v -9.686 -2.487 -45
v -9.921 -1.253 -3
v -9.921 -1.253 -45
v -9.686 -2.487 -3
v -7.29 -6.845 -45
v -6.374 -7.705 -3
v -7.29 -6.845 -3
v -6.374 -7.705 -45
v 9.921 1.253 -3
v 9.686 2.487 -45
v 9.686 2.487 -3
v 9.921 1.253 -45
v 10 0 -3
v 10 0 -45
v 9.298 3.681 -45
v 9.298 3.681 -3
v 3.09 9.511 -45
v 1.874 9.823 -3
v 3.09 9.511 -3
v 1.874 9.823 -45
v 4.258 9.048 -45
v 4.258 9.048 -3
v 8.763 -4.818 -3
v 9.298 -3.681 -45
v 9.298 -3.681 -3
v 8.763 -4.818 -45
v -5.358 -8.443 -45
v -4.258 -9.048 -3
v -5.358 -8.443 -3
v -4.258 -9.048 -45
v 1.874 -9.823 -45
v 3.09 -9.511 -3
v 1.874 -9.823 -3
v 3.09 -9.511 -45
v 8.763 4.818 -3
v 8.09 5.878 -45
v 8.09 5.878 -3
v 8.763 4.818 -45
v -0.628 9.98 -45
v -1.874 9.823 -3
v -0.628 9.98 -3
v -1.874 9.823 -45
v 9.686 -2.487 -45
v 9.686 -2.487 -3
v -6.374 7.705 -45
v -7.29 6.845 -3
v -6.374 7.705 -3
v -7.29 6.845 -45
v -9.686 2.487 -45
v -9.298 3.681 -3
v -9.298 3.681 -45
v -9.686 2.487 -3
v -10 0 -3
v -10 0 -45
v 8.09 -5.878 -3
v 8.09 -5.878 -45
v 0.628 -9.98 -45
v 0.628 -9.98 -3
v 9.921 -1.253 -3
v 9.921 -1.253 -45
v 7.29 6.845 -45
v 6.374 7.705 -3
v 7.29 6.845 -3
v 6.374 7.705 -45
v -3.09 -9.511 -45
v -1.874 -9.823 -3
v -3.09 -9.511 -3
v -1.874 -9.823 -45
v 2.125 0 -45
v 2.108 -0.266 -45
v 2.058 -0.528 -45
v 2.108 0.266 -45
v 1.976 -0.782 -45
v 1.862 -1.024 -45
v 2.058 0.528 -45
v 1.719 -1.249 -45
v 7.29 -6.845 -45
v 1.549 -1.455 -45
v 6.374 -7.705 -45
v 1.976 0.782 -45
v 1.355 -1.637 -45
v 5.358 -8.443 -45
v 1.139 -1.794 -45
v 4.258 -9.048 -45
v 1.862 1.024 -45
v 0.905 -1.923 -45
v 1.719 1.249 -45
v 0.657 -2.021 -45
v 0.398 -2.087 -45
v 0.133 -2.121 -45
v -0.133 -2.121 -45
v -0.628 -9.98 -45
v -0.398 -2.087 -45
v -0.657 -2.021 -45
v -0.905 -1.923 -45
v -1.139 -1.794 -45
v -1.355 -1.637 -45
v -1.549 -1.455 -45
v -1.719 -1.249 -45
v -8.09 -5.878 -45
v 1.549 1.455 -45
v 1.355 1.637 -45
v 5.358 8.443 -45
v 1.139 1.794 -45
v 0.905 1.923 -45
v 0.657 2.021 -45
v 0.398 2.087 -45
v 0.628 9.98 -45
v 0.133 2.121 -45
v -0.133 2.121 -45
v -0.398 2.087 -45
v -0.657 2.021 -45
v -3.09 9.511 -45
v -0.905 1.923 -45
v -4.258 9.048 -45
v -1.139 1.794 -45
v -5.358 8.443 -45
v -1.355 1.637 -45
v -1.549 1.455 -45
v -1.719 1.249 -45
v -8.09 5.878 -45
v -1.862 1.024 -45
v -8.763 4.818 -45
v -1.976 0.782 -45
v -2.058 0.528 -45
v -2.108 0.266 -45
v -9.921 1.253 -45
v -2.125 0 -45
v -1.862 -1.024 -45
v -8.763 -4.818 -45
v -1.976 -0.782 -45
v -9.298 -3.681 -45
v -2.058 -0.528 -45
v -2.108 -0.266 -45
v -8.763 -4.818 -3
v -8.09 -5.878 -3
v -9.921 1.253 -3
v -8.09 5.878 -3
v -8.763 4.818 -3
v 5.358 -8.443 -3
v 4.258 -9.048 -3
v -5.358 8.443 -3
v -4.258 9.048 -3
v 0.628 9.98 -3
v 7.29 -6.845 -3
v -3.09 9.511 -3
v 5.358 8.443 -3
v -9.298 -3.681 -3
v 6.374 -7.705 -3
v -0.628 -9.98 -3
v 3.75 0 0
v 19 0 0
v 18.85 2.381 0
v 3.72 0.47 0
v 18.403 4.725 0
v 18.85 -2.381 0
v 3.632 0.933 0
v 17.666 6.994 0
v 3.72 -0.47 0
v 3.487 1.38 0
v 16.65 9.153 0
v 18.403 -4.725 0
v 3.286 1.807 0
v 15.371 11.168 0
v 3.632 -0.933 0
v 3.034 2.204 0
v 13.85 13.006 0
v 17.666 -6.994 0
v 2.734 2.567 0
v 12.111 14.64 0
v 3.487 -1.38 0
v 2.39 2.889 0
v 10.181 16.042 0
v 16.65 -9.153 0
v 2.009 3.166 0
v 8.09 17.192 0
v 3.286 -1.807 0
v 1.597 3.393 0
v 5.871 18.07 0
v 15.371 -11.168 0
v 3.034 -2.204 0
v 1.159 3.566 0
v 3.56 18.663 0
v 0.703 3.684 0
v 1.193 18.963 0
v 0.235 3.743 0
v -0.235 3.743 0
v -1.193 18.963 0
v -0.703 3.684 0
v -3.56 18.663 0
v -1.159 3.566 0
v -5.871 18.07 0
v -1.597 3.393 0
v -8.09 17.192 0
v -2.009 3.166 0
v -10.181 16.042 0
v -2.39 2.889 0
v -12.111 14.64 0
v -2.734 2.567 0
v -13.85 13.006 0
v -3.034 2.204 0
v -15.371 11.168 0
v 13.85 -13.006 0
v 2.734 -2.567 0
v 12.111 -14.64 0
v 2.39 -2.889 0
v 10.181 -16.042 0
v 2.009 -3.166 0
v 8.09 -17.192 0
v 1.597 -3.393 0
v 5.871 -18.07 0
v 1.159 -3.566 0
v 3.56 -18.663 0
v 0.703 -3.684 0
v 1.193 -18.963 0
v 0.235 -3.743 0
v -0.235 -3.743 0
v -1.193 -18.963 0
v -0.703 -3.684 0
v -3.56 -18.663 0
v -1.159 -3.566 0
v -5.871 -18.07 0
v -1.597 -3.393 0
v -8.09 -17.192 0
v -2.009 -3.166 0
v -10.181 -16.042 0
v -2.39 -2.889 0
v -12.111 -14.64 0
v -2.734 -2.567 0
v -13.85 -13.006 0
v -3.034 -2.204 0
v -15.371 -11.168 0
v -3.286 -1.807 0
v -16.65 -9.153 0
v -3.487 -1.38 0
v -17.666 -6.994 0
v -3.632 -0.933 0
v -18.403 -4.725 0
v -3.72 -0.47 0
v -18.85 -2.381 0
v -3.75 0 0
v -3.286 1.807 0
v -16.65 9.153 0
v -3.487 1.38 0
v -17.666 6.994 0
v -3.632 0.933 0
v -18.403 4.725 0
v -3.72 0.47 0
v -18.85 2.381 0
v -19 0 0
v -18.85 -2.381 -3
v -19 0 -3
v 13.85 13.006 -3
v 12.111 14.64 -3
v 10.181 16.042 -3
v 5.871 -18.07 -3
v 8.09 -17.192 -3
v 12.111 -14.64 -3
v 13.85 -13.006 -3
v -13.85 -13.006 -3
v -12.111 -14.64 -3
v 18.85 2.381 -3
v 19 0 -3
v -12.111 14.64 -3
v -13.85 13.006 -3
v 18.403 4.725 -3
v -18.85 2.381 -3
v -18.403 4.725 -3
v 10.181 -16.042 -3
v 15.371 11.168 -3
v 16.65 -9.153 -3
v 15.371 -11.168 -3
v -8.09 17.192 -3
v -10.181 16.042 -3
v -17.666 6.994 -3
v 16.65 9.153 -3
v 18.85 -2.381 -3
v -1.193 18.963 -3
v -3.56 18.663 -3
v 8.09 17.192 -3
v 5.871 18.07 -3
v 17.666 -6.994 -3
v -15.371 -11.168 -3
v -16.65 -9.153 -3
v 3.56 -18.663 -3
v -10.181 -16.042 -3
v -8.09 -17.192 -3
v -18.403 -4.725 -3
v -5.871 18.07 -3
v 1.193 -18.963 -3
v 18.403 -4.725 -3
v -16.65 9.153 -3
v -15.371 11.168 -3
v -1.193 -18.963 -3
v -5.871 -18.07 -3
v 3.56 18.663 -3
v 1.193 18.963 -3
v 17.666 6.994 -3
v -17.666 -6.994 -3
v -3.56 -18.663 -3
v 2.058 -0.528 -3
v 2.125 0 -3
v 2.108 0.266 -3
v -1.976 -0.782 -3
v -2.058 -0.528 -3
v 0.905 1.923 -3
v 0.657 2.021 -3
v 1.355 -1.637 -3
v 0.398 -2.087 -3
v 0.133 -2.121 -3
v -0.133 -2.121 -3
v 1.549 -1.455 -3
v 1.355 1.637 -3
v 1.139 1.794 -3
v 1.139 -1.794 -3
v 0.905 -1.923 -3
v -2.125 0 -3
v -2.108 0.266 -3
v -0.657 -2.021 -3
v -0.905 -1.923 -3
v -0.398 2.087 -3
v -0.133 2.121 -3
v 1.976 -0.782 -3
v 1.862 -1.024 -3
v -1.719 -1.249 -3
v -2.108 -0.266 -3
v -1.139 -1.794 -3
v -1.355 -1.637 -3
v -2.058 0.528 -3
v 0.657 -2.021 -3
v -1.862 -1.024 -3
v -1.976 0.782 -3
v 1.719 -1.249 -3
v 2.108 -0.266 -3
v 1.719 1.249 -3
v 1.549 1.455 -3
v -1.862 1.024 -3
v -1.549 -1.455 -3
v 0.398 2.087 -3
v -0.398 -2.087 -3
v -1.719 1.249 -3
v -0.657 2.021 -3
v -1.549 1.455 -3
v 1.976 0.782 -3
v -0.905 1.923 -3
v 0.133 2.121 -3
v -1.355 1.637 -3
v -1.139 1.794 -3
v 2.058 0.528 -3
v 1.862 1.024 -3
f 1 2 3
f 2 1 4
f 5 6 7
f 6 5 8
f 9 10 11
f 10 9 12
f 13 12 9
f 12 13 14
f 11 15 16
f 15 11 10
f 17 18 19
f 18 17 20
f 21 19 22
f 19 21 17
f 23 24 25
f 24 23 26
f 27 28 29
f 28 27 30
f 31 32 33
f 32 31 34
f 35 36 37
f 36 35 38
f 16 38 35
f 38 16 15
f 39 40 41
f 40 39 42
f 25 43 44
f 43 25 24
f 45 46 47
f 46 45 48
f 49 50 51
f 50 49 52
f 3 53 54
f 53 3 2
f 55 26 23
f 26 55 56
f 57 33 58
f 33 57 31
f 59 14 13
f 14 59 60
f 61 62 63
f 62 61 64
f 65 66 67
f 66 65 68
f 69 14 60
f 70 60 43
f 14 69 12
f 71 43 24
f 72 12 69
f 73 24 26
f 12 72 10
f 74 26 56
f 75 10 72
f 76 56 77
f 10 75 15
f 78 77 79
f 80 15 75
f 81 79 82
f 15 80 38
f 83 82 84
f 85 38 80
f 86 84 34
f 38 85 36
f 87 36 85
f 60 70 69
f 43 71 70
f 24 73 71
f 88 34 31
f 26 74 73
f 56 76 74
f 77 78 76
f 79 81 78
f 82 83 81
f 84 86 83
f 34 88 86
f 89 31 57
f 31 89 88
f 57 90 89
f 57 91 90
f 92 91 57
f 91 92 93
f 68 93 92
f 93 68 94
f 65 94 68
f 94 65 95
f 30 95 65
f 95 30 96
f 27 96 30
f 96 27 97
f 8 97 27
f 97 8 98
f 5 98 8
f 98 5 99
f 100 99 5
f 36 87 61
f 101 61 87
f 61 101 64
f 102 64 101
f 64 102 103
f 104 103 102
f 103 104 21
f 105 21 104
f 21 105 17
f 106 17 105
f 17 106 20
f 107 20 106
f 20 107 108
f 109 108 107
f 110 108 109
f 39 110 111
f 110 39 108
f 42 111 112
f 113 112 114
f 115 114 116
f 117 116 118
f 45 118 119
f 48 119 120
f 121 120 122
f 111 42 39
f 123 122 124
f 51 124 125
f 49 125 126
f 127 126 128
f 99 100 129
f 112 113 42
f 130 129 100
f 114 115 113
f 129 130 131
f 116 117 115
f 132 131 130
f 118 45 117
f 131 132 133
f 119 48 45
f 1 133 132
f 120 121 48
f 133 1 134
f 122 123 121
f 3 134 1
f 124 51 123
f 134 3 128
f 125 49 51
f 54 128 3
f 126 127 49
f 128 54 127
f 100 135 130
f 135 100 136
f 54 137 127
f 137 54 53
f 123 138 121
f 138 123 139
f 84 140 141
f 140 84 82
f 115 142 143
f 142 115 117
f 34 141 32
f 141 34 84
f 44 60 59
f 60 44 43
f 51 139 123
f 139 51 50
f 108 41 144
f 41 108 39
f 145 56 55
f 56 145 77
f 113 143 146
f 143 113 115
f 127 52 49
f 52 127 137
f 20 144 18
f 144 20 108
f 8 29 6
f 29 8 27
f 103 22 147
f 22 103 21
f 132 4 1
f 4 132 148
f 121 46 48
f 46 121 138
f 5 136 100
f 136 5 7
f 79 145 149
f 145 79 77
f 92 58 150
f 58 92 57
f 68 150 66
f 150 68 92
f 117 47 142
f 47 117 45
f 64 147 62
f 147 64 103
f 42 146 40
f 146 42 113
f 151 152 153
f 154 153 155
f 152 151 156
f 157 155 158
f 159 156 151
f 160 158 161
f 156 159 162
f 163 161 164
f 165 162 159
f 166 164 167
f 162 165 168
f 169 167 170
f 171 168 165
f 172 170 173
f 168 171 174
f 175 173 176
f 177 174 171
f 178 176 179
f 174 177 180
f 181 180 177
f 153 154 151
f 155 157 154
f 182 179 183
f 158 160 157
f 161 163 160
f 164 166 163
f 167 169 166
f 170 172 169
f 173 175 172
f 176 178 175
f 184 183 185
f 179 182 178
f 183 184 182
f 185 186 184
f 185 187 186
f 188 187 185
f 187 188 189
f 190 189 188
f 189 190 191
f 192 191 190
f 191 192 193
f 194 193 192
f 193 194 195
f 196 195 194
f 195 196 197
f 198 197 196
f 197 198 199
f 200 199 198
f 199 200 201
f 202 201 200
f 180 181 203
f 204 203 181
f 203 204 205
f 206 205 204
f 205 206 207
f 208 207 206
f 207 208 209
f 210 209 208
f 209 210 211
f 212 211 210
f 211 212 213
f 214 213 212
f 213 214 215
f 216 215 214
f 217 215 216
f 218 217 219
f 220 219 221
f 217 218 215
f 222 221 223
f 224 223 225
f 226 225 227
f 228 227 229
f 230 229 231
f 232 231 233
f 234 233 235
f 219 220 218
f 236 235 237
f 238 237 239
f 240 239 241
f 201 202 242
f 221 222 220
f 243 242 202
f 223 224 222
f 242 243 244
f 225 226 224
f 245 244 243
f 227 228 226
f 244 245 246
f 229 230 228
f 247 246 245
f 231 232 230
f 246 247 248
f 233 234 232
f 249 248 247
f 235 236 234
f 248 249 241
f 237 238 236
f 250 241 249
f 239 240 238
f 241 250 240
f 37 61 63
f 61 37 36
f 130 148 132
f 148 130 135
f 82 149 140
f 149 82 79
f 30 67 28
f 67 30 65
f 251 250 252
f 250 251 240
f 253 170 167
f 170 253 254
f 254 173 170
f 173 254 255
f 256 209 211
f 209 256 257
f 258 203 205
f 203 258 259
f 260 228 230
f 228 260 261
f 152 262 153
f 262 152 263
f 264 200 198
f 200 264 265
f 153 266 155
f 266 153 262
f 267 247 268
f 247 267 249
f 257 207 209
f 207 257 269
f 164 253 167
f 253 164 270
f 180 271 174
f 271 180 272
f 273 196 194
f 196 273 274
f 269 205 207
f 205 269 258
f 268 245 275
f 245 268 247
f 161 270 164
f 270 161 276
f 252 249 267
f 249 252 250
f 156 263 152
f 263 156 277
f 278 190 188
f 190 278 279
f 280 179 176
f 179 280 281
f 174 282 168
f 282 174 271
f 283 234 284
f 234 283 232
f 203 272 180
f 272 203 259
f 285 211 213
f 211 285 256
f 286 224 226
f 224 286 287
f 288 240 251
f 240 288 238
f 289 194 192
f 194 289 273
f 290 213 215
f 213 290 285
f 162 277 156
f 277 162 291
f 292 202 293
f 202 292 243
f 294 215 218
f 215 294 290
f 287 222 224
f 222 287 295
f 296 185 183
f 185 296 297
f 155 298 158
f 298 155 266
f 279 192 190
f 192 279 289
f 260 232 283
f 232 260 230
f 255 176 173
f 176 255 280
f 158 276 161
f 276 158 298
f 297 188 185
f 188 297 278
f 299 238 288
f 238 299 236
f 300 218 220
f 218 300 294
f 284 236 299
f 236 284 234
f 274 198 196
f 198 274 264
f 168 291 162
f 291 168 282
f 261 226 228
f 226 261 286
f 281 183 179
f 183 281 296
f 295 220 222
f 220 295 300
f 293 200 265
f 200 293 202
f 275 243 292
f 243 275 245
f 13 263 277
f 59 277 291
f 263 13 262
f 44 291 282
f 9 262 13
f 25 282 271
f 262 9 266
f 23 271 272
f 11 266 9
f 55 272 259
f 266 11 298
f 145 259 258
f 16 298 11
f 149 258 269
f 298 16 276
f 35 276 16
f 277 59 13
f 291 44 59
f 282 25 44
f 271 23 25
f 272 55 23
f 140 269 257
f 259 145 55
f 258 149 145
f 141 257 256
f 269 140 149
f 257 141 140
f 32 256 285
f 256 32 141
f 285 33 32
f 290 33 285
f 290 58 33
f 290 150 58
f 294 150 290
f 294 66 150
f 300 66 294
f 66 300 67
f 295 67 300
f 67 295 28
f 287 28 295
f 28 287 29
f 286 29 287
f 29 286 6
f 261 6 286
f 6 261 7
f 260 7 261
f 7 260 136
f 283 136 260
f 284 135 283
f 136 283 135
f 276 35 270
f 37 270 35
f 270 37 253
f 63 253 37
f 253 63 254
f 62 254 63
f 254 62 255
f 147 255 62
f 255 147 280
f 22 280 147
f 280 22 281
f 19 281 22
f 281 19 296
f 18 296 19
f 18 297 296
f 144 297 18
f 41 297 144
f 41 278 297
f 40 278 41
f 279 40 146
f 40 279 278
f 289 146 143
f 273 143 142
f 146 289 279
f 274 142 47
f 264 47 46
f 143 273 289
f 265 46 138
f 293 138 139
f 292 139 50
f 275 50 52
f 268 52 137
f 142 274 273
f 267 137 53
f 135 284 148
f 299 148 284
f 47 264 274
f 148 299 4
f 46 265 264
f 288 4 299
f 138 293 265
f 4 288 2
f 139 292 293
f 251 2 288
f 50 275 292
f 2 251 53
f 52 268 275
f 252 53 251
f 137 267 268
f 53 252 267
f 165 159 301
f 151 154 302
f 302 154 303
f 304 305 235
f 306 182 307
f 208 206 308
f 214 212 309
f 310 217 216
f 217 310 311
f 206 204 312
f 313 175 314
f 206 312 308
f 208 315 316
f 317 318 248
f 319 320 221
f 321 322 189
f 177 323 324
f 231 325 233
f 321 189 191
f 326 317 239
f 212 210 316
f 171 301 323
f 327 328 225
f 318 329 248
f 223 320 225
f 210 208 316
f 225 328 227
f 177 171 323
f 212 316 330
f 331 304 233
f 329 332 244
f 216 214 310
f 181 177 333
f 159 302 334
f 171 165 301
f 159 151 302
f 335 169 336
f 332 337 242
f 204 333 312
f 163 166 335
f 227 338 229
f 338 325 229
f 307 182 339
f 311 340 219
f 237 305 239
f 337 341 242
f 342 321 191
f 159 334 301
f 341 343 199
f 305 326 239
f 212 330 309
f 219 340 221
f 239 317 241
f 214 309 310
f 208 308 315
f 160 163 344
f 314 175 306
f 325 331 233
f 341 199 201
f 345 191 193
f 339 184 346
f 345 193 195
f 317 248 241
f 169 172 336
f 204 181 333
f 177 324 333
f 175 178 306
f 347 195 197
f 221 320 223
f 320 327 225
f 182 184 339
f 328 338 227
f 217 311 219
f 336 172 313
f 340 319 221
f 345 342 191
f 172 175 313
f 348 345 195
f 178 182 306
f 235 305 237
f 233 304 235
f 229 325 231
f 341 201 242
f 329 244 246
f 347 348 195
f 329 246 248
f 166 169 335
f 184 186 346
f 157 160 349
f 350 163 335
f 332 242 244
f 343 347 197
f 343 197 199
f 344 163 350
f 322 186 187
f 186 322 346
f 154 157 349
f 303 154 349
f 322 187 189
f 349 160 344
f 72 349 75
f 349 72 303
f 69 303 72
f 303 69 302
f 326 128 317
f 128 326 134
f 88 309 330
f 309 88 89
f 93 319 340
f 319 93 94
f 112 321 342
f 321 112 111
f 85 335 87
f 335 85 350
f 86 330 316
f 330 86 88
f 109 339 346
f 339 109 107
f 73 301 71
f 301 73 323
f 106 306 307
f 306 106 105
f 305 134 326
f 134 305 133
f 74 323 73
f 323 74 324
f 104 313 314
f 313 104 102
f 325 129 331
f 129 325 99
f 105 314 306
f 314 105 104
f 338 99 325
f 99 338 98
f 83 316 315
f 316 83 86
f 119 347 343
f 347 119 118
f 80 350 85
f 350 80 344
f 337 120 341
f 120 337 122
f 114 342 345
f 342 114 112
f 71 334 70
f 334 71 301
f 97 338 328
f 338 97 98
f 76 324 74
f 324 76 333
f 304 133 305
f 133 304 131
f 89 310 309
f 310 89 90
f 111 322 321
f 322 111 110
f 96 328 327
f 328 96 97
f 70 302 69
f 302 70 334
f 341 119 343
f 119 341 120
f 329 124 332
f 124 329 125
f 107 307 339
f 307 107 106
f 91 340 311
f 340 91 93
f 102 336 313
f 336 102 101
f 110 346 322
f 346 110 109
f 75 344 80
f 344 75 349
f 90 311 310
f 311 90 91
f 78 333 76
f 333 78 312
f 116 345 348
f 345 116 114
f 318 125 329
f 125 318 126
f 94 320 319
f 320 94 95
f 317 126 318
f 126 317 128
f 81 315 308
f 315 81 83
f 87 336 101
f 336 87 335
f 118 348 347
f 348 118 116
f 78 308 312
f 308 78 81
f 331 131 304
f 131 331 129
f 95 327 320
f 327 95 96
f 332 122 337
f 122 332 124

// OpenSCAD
$fn = 50;


difference() {
	union() {
		translate(v = [0, 0, -45.0000000000]) {
			cylinder(h = 45, r = 10.0000000000);
		}
		translate(v = [0, 0, -3.0000000000]) {
			cylinder(h = 3, r = 19.0000000000);
		}
	}
	union() {
		translate(v = [0, 0, 0]) {
			rotate(a = [0, 0, 0]) {
				difference() {
					union() {
						#translate(v = [0, 0, -45.0000000000]) {
							cylinder(h = 45, r = 2.0000000000);
						}
						#translate(v = [0, 0, -3]) {
							cylinder(h = 3, r1 = 2.1250000000, r2 = 3.7500000000);
						}
						#translate(v = [0, 0, -45.0000000000]) {
							cylinder(h = 45, r = 2.1250000000);
						}
						#translate(v = [0, 0, -45.0000000000]) {
							cylinder(h = 45, r = 2.0000000000);
						}
					}
					union();
				}
			}
		}
	}
}
